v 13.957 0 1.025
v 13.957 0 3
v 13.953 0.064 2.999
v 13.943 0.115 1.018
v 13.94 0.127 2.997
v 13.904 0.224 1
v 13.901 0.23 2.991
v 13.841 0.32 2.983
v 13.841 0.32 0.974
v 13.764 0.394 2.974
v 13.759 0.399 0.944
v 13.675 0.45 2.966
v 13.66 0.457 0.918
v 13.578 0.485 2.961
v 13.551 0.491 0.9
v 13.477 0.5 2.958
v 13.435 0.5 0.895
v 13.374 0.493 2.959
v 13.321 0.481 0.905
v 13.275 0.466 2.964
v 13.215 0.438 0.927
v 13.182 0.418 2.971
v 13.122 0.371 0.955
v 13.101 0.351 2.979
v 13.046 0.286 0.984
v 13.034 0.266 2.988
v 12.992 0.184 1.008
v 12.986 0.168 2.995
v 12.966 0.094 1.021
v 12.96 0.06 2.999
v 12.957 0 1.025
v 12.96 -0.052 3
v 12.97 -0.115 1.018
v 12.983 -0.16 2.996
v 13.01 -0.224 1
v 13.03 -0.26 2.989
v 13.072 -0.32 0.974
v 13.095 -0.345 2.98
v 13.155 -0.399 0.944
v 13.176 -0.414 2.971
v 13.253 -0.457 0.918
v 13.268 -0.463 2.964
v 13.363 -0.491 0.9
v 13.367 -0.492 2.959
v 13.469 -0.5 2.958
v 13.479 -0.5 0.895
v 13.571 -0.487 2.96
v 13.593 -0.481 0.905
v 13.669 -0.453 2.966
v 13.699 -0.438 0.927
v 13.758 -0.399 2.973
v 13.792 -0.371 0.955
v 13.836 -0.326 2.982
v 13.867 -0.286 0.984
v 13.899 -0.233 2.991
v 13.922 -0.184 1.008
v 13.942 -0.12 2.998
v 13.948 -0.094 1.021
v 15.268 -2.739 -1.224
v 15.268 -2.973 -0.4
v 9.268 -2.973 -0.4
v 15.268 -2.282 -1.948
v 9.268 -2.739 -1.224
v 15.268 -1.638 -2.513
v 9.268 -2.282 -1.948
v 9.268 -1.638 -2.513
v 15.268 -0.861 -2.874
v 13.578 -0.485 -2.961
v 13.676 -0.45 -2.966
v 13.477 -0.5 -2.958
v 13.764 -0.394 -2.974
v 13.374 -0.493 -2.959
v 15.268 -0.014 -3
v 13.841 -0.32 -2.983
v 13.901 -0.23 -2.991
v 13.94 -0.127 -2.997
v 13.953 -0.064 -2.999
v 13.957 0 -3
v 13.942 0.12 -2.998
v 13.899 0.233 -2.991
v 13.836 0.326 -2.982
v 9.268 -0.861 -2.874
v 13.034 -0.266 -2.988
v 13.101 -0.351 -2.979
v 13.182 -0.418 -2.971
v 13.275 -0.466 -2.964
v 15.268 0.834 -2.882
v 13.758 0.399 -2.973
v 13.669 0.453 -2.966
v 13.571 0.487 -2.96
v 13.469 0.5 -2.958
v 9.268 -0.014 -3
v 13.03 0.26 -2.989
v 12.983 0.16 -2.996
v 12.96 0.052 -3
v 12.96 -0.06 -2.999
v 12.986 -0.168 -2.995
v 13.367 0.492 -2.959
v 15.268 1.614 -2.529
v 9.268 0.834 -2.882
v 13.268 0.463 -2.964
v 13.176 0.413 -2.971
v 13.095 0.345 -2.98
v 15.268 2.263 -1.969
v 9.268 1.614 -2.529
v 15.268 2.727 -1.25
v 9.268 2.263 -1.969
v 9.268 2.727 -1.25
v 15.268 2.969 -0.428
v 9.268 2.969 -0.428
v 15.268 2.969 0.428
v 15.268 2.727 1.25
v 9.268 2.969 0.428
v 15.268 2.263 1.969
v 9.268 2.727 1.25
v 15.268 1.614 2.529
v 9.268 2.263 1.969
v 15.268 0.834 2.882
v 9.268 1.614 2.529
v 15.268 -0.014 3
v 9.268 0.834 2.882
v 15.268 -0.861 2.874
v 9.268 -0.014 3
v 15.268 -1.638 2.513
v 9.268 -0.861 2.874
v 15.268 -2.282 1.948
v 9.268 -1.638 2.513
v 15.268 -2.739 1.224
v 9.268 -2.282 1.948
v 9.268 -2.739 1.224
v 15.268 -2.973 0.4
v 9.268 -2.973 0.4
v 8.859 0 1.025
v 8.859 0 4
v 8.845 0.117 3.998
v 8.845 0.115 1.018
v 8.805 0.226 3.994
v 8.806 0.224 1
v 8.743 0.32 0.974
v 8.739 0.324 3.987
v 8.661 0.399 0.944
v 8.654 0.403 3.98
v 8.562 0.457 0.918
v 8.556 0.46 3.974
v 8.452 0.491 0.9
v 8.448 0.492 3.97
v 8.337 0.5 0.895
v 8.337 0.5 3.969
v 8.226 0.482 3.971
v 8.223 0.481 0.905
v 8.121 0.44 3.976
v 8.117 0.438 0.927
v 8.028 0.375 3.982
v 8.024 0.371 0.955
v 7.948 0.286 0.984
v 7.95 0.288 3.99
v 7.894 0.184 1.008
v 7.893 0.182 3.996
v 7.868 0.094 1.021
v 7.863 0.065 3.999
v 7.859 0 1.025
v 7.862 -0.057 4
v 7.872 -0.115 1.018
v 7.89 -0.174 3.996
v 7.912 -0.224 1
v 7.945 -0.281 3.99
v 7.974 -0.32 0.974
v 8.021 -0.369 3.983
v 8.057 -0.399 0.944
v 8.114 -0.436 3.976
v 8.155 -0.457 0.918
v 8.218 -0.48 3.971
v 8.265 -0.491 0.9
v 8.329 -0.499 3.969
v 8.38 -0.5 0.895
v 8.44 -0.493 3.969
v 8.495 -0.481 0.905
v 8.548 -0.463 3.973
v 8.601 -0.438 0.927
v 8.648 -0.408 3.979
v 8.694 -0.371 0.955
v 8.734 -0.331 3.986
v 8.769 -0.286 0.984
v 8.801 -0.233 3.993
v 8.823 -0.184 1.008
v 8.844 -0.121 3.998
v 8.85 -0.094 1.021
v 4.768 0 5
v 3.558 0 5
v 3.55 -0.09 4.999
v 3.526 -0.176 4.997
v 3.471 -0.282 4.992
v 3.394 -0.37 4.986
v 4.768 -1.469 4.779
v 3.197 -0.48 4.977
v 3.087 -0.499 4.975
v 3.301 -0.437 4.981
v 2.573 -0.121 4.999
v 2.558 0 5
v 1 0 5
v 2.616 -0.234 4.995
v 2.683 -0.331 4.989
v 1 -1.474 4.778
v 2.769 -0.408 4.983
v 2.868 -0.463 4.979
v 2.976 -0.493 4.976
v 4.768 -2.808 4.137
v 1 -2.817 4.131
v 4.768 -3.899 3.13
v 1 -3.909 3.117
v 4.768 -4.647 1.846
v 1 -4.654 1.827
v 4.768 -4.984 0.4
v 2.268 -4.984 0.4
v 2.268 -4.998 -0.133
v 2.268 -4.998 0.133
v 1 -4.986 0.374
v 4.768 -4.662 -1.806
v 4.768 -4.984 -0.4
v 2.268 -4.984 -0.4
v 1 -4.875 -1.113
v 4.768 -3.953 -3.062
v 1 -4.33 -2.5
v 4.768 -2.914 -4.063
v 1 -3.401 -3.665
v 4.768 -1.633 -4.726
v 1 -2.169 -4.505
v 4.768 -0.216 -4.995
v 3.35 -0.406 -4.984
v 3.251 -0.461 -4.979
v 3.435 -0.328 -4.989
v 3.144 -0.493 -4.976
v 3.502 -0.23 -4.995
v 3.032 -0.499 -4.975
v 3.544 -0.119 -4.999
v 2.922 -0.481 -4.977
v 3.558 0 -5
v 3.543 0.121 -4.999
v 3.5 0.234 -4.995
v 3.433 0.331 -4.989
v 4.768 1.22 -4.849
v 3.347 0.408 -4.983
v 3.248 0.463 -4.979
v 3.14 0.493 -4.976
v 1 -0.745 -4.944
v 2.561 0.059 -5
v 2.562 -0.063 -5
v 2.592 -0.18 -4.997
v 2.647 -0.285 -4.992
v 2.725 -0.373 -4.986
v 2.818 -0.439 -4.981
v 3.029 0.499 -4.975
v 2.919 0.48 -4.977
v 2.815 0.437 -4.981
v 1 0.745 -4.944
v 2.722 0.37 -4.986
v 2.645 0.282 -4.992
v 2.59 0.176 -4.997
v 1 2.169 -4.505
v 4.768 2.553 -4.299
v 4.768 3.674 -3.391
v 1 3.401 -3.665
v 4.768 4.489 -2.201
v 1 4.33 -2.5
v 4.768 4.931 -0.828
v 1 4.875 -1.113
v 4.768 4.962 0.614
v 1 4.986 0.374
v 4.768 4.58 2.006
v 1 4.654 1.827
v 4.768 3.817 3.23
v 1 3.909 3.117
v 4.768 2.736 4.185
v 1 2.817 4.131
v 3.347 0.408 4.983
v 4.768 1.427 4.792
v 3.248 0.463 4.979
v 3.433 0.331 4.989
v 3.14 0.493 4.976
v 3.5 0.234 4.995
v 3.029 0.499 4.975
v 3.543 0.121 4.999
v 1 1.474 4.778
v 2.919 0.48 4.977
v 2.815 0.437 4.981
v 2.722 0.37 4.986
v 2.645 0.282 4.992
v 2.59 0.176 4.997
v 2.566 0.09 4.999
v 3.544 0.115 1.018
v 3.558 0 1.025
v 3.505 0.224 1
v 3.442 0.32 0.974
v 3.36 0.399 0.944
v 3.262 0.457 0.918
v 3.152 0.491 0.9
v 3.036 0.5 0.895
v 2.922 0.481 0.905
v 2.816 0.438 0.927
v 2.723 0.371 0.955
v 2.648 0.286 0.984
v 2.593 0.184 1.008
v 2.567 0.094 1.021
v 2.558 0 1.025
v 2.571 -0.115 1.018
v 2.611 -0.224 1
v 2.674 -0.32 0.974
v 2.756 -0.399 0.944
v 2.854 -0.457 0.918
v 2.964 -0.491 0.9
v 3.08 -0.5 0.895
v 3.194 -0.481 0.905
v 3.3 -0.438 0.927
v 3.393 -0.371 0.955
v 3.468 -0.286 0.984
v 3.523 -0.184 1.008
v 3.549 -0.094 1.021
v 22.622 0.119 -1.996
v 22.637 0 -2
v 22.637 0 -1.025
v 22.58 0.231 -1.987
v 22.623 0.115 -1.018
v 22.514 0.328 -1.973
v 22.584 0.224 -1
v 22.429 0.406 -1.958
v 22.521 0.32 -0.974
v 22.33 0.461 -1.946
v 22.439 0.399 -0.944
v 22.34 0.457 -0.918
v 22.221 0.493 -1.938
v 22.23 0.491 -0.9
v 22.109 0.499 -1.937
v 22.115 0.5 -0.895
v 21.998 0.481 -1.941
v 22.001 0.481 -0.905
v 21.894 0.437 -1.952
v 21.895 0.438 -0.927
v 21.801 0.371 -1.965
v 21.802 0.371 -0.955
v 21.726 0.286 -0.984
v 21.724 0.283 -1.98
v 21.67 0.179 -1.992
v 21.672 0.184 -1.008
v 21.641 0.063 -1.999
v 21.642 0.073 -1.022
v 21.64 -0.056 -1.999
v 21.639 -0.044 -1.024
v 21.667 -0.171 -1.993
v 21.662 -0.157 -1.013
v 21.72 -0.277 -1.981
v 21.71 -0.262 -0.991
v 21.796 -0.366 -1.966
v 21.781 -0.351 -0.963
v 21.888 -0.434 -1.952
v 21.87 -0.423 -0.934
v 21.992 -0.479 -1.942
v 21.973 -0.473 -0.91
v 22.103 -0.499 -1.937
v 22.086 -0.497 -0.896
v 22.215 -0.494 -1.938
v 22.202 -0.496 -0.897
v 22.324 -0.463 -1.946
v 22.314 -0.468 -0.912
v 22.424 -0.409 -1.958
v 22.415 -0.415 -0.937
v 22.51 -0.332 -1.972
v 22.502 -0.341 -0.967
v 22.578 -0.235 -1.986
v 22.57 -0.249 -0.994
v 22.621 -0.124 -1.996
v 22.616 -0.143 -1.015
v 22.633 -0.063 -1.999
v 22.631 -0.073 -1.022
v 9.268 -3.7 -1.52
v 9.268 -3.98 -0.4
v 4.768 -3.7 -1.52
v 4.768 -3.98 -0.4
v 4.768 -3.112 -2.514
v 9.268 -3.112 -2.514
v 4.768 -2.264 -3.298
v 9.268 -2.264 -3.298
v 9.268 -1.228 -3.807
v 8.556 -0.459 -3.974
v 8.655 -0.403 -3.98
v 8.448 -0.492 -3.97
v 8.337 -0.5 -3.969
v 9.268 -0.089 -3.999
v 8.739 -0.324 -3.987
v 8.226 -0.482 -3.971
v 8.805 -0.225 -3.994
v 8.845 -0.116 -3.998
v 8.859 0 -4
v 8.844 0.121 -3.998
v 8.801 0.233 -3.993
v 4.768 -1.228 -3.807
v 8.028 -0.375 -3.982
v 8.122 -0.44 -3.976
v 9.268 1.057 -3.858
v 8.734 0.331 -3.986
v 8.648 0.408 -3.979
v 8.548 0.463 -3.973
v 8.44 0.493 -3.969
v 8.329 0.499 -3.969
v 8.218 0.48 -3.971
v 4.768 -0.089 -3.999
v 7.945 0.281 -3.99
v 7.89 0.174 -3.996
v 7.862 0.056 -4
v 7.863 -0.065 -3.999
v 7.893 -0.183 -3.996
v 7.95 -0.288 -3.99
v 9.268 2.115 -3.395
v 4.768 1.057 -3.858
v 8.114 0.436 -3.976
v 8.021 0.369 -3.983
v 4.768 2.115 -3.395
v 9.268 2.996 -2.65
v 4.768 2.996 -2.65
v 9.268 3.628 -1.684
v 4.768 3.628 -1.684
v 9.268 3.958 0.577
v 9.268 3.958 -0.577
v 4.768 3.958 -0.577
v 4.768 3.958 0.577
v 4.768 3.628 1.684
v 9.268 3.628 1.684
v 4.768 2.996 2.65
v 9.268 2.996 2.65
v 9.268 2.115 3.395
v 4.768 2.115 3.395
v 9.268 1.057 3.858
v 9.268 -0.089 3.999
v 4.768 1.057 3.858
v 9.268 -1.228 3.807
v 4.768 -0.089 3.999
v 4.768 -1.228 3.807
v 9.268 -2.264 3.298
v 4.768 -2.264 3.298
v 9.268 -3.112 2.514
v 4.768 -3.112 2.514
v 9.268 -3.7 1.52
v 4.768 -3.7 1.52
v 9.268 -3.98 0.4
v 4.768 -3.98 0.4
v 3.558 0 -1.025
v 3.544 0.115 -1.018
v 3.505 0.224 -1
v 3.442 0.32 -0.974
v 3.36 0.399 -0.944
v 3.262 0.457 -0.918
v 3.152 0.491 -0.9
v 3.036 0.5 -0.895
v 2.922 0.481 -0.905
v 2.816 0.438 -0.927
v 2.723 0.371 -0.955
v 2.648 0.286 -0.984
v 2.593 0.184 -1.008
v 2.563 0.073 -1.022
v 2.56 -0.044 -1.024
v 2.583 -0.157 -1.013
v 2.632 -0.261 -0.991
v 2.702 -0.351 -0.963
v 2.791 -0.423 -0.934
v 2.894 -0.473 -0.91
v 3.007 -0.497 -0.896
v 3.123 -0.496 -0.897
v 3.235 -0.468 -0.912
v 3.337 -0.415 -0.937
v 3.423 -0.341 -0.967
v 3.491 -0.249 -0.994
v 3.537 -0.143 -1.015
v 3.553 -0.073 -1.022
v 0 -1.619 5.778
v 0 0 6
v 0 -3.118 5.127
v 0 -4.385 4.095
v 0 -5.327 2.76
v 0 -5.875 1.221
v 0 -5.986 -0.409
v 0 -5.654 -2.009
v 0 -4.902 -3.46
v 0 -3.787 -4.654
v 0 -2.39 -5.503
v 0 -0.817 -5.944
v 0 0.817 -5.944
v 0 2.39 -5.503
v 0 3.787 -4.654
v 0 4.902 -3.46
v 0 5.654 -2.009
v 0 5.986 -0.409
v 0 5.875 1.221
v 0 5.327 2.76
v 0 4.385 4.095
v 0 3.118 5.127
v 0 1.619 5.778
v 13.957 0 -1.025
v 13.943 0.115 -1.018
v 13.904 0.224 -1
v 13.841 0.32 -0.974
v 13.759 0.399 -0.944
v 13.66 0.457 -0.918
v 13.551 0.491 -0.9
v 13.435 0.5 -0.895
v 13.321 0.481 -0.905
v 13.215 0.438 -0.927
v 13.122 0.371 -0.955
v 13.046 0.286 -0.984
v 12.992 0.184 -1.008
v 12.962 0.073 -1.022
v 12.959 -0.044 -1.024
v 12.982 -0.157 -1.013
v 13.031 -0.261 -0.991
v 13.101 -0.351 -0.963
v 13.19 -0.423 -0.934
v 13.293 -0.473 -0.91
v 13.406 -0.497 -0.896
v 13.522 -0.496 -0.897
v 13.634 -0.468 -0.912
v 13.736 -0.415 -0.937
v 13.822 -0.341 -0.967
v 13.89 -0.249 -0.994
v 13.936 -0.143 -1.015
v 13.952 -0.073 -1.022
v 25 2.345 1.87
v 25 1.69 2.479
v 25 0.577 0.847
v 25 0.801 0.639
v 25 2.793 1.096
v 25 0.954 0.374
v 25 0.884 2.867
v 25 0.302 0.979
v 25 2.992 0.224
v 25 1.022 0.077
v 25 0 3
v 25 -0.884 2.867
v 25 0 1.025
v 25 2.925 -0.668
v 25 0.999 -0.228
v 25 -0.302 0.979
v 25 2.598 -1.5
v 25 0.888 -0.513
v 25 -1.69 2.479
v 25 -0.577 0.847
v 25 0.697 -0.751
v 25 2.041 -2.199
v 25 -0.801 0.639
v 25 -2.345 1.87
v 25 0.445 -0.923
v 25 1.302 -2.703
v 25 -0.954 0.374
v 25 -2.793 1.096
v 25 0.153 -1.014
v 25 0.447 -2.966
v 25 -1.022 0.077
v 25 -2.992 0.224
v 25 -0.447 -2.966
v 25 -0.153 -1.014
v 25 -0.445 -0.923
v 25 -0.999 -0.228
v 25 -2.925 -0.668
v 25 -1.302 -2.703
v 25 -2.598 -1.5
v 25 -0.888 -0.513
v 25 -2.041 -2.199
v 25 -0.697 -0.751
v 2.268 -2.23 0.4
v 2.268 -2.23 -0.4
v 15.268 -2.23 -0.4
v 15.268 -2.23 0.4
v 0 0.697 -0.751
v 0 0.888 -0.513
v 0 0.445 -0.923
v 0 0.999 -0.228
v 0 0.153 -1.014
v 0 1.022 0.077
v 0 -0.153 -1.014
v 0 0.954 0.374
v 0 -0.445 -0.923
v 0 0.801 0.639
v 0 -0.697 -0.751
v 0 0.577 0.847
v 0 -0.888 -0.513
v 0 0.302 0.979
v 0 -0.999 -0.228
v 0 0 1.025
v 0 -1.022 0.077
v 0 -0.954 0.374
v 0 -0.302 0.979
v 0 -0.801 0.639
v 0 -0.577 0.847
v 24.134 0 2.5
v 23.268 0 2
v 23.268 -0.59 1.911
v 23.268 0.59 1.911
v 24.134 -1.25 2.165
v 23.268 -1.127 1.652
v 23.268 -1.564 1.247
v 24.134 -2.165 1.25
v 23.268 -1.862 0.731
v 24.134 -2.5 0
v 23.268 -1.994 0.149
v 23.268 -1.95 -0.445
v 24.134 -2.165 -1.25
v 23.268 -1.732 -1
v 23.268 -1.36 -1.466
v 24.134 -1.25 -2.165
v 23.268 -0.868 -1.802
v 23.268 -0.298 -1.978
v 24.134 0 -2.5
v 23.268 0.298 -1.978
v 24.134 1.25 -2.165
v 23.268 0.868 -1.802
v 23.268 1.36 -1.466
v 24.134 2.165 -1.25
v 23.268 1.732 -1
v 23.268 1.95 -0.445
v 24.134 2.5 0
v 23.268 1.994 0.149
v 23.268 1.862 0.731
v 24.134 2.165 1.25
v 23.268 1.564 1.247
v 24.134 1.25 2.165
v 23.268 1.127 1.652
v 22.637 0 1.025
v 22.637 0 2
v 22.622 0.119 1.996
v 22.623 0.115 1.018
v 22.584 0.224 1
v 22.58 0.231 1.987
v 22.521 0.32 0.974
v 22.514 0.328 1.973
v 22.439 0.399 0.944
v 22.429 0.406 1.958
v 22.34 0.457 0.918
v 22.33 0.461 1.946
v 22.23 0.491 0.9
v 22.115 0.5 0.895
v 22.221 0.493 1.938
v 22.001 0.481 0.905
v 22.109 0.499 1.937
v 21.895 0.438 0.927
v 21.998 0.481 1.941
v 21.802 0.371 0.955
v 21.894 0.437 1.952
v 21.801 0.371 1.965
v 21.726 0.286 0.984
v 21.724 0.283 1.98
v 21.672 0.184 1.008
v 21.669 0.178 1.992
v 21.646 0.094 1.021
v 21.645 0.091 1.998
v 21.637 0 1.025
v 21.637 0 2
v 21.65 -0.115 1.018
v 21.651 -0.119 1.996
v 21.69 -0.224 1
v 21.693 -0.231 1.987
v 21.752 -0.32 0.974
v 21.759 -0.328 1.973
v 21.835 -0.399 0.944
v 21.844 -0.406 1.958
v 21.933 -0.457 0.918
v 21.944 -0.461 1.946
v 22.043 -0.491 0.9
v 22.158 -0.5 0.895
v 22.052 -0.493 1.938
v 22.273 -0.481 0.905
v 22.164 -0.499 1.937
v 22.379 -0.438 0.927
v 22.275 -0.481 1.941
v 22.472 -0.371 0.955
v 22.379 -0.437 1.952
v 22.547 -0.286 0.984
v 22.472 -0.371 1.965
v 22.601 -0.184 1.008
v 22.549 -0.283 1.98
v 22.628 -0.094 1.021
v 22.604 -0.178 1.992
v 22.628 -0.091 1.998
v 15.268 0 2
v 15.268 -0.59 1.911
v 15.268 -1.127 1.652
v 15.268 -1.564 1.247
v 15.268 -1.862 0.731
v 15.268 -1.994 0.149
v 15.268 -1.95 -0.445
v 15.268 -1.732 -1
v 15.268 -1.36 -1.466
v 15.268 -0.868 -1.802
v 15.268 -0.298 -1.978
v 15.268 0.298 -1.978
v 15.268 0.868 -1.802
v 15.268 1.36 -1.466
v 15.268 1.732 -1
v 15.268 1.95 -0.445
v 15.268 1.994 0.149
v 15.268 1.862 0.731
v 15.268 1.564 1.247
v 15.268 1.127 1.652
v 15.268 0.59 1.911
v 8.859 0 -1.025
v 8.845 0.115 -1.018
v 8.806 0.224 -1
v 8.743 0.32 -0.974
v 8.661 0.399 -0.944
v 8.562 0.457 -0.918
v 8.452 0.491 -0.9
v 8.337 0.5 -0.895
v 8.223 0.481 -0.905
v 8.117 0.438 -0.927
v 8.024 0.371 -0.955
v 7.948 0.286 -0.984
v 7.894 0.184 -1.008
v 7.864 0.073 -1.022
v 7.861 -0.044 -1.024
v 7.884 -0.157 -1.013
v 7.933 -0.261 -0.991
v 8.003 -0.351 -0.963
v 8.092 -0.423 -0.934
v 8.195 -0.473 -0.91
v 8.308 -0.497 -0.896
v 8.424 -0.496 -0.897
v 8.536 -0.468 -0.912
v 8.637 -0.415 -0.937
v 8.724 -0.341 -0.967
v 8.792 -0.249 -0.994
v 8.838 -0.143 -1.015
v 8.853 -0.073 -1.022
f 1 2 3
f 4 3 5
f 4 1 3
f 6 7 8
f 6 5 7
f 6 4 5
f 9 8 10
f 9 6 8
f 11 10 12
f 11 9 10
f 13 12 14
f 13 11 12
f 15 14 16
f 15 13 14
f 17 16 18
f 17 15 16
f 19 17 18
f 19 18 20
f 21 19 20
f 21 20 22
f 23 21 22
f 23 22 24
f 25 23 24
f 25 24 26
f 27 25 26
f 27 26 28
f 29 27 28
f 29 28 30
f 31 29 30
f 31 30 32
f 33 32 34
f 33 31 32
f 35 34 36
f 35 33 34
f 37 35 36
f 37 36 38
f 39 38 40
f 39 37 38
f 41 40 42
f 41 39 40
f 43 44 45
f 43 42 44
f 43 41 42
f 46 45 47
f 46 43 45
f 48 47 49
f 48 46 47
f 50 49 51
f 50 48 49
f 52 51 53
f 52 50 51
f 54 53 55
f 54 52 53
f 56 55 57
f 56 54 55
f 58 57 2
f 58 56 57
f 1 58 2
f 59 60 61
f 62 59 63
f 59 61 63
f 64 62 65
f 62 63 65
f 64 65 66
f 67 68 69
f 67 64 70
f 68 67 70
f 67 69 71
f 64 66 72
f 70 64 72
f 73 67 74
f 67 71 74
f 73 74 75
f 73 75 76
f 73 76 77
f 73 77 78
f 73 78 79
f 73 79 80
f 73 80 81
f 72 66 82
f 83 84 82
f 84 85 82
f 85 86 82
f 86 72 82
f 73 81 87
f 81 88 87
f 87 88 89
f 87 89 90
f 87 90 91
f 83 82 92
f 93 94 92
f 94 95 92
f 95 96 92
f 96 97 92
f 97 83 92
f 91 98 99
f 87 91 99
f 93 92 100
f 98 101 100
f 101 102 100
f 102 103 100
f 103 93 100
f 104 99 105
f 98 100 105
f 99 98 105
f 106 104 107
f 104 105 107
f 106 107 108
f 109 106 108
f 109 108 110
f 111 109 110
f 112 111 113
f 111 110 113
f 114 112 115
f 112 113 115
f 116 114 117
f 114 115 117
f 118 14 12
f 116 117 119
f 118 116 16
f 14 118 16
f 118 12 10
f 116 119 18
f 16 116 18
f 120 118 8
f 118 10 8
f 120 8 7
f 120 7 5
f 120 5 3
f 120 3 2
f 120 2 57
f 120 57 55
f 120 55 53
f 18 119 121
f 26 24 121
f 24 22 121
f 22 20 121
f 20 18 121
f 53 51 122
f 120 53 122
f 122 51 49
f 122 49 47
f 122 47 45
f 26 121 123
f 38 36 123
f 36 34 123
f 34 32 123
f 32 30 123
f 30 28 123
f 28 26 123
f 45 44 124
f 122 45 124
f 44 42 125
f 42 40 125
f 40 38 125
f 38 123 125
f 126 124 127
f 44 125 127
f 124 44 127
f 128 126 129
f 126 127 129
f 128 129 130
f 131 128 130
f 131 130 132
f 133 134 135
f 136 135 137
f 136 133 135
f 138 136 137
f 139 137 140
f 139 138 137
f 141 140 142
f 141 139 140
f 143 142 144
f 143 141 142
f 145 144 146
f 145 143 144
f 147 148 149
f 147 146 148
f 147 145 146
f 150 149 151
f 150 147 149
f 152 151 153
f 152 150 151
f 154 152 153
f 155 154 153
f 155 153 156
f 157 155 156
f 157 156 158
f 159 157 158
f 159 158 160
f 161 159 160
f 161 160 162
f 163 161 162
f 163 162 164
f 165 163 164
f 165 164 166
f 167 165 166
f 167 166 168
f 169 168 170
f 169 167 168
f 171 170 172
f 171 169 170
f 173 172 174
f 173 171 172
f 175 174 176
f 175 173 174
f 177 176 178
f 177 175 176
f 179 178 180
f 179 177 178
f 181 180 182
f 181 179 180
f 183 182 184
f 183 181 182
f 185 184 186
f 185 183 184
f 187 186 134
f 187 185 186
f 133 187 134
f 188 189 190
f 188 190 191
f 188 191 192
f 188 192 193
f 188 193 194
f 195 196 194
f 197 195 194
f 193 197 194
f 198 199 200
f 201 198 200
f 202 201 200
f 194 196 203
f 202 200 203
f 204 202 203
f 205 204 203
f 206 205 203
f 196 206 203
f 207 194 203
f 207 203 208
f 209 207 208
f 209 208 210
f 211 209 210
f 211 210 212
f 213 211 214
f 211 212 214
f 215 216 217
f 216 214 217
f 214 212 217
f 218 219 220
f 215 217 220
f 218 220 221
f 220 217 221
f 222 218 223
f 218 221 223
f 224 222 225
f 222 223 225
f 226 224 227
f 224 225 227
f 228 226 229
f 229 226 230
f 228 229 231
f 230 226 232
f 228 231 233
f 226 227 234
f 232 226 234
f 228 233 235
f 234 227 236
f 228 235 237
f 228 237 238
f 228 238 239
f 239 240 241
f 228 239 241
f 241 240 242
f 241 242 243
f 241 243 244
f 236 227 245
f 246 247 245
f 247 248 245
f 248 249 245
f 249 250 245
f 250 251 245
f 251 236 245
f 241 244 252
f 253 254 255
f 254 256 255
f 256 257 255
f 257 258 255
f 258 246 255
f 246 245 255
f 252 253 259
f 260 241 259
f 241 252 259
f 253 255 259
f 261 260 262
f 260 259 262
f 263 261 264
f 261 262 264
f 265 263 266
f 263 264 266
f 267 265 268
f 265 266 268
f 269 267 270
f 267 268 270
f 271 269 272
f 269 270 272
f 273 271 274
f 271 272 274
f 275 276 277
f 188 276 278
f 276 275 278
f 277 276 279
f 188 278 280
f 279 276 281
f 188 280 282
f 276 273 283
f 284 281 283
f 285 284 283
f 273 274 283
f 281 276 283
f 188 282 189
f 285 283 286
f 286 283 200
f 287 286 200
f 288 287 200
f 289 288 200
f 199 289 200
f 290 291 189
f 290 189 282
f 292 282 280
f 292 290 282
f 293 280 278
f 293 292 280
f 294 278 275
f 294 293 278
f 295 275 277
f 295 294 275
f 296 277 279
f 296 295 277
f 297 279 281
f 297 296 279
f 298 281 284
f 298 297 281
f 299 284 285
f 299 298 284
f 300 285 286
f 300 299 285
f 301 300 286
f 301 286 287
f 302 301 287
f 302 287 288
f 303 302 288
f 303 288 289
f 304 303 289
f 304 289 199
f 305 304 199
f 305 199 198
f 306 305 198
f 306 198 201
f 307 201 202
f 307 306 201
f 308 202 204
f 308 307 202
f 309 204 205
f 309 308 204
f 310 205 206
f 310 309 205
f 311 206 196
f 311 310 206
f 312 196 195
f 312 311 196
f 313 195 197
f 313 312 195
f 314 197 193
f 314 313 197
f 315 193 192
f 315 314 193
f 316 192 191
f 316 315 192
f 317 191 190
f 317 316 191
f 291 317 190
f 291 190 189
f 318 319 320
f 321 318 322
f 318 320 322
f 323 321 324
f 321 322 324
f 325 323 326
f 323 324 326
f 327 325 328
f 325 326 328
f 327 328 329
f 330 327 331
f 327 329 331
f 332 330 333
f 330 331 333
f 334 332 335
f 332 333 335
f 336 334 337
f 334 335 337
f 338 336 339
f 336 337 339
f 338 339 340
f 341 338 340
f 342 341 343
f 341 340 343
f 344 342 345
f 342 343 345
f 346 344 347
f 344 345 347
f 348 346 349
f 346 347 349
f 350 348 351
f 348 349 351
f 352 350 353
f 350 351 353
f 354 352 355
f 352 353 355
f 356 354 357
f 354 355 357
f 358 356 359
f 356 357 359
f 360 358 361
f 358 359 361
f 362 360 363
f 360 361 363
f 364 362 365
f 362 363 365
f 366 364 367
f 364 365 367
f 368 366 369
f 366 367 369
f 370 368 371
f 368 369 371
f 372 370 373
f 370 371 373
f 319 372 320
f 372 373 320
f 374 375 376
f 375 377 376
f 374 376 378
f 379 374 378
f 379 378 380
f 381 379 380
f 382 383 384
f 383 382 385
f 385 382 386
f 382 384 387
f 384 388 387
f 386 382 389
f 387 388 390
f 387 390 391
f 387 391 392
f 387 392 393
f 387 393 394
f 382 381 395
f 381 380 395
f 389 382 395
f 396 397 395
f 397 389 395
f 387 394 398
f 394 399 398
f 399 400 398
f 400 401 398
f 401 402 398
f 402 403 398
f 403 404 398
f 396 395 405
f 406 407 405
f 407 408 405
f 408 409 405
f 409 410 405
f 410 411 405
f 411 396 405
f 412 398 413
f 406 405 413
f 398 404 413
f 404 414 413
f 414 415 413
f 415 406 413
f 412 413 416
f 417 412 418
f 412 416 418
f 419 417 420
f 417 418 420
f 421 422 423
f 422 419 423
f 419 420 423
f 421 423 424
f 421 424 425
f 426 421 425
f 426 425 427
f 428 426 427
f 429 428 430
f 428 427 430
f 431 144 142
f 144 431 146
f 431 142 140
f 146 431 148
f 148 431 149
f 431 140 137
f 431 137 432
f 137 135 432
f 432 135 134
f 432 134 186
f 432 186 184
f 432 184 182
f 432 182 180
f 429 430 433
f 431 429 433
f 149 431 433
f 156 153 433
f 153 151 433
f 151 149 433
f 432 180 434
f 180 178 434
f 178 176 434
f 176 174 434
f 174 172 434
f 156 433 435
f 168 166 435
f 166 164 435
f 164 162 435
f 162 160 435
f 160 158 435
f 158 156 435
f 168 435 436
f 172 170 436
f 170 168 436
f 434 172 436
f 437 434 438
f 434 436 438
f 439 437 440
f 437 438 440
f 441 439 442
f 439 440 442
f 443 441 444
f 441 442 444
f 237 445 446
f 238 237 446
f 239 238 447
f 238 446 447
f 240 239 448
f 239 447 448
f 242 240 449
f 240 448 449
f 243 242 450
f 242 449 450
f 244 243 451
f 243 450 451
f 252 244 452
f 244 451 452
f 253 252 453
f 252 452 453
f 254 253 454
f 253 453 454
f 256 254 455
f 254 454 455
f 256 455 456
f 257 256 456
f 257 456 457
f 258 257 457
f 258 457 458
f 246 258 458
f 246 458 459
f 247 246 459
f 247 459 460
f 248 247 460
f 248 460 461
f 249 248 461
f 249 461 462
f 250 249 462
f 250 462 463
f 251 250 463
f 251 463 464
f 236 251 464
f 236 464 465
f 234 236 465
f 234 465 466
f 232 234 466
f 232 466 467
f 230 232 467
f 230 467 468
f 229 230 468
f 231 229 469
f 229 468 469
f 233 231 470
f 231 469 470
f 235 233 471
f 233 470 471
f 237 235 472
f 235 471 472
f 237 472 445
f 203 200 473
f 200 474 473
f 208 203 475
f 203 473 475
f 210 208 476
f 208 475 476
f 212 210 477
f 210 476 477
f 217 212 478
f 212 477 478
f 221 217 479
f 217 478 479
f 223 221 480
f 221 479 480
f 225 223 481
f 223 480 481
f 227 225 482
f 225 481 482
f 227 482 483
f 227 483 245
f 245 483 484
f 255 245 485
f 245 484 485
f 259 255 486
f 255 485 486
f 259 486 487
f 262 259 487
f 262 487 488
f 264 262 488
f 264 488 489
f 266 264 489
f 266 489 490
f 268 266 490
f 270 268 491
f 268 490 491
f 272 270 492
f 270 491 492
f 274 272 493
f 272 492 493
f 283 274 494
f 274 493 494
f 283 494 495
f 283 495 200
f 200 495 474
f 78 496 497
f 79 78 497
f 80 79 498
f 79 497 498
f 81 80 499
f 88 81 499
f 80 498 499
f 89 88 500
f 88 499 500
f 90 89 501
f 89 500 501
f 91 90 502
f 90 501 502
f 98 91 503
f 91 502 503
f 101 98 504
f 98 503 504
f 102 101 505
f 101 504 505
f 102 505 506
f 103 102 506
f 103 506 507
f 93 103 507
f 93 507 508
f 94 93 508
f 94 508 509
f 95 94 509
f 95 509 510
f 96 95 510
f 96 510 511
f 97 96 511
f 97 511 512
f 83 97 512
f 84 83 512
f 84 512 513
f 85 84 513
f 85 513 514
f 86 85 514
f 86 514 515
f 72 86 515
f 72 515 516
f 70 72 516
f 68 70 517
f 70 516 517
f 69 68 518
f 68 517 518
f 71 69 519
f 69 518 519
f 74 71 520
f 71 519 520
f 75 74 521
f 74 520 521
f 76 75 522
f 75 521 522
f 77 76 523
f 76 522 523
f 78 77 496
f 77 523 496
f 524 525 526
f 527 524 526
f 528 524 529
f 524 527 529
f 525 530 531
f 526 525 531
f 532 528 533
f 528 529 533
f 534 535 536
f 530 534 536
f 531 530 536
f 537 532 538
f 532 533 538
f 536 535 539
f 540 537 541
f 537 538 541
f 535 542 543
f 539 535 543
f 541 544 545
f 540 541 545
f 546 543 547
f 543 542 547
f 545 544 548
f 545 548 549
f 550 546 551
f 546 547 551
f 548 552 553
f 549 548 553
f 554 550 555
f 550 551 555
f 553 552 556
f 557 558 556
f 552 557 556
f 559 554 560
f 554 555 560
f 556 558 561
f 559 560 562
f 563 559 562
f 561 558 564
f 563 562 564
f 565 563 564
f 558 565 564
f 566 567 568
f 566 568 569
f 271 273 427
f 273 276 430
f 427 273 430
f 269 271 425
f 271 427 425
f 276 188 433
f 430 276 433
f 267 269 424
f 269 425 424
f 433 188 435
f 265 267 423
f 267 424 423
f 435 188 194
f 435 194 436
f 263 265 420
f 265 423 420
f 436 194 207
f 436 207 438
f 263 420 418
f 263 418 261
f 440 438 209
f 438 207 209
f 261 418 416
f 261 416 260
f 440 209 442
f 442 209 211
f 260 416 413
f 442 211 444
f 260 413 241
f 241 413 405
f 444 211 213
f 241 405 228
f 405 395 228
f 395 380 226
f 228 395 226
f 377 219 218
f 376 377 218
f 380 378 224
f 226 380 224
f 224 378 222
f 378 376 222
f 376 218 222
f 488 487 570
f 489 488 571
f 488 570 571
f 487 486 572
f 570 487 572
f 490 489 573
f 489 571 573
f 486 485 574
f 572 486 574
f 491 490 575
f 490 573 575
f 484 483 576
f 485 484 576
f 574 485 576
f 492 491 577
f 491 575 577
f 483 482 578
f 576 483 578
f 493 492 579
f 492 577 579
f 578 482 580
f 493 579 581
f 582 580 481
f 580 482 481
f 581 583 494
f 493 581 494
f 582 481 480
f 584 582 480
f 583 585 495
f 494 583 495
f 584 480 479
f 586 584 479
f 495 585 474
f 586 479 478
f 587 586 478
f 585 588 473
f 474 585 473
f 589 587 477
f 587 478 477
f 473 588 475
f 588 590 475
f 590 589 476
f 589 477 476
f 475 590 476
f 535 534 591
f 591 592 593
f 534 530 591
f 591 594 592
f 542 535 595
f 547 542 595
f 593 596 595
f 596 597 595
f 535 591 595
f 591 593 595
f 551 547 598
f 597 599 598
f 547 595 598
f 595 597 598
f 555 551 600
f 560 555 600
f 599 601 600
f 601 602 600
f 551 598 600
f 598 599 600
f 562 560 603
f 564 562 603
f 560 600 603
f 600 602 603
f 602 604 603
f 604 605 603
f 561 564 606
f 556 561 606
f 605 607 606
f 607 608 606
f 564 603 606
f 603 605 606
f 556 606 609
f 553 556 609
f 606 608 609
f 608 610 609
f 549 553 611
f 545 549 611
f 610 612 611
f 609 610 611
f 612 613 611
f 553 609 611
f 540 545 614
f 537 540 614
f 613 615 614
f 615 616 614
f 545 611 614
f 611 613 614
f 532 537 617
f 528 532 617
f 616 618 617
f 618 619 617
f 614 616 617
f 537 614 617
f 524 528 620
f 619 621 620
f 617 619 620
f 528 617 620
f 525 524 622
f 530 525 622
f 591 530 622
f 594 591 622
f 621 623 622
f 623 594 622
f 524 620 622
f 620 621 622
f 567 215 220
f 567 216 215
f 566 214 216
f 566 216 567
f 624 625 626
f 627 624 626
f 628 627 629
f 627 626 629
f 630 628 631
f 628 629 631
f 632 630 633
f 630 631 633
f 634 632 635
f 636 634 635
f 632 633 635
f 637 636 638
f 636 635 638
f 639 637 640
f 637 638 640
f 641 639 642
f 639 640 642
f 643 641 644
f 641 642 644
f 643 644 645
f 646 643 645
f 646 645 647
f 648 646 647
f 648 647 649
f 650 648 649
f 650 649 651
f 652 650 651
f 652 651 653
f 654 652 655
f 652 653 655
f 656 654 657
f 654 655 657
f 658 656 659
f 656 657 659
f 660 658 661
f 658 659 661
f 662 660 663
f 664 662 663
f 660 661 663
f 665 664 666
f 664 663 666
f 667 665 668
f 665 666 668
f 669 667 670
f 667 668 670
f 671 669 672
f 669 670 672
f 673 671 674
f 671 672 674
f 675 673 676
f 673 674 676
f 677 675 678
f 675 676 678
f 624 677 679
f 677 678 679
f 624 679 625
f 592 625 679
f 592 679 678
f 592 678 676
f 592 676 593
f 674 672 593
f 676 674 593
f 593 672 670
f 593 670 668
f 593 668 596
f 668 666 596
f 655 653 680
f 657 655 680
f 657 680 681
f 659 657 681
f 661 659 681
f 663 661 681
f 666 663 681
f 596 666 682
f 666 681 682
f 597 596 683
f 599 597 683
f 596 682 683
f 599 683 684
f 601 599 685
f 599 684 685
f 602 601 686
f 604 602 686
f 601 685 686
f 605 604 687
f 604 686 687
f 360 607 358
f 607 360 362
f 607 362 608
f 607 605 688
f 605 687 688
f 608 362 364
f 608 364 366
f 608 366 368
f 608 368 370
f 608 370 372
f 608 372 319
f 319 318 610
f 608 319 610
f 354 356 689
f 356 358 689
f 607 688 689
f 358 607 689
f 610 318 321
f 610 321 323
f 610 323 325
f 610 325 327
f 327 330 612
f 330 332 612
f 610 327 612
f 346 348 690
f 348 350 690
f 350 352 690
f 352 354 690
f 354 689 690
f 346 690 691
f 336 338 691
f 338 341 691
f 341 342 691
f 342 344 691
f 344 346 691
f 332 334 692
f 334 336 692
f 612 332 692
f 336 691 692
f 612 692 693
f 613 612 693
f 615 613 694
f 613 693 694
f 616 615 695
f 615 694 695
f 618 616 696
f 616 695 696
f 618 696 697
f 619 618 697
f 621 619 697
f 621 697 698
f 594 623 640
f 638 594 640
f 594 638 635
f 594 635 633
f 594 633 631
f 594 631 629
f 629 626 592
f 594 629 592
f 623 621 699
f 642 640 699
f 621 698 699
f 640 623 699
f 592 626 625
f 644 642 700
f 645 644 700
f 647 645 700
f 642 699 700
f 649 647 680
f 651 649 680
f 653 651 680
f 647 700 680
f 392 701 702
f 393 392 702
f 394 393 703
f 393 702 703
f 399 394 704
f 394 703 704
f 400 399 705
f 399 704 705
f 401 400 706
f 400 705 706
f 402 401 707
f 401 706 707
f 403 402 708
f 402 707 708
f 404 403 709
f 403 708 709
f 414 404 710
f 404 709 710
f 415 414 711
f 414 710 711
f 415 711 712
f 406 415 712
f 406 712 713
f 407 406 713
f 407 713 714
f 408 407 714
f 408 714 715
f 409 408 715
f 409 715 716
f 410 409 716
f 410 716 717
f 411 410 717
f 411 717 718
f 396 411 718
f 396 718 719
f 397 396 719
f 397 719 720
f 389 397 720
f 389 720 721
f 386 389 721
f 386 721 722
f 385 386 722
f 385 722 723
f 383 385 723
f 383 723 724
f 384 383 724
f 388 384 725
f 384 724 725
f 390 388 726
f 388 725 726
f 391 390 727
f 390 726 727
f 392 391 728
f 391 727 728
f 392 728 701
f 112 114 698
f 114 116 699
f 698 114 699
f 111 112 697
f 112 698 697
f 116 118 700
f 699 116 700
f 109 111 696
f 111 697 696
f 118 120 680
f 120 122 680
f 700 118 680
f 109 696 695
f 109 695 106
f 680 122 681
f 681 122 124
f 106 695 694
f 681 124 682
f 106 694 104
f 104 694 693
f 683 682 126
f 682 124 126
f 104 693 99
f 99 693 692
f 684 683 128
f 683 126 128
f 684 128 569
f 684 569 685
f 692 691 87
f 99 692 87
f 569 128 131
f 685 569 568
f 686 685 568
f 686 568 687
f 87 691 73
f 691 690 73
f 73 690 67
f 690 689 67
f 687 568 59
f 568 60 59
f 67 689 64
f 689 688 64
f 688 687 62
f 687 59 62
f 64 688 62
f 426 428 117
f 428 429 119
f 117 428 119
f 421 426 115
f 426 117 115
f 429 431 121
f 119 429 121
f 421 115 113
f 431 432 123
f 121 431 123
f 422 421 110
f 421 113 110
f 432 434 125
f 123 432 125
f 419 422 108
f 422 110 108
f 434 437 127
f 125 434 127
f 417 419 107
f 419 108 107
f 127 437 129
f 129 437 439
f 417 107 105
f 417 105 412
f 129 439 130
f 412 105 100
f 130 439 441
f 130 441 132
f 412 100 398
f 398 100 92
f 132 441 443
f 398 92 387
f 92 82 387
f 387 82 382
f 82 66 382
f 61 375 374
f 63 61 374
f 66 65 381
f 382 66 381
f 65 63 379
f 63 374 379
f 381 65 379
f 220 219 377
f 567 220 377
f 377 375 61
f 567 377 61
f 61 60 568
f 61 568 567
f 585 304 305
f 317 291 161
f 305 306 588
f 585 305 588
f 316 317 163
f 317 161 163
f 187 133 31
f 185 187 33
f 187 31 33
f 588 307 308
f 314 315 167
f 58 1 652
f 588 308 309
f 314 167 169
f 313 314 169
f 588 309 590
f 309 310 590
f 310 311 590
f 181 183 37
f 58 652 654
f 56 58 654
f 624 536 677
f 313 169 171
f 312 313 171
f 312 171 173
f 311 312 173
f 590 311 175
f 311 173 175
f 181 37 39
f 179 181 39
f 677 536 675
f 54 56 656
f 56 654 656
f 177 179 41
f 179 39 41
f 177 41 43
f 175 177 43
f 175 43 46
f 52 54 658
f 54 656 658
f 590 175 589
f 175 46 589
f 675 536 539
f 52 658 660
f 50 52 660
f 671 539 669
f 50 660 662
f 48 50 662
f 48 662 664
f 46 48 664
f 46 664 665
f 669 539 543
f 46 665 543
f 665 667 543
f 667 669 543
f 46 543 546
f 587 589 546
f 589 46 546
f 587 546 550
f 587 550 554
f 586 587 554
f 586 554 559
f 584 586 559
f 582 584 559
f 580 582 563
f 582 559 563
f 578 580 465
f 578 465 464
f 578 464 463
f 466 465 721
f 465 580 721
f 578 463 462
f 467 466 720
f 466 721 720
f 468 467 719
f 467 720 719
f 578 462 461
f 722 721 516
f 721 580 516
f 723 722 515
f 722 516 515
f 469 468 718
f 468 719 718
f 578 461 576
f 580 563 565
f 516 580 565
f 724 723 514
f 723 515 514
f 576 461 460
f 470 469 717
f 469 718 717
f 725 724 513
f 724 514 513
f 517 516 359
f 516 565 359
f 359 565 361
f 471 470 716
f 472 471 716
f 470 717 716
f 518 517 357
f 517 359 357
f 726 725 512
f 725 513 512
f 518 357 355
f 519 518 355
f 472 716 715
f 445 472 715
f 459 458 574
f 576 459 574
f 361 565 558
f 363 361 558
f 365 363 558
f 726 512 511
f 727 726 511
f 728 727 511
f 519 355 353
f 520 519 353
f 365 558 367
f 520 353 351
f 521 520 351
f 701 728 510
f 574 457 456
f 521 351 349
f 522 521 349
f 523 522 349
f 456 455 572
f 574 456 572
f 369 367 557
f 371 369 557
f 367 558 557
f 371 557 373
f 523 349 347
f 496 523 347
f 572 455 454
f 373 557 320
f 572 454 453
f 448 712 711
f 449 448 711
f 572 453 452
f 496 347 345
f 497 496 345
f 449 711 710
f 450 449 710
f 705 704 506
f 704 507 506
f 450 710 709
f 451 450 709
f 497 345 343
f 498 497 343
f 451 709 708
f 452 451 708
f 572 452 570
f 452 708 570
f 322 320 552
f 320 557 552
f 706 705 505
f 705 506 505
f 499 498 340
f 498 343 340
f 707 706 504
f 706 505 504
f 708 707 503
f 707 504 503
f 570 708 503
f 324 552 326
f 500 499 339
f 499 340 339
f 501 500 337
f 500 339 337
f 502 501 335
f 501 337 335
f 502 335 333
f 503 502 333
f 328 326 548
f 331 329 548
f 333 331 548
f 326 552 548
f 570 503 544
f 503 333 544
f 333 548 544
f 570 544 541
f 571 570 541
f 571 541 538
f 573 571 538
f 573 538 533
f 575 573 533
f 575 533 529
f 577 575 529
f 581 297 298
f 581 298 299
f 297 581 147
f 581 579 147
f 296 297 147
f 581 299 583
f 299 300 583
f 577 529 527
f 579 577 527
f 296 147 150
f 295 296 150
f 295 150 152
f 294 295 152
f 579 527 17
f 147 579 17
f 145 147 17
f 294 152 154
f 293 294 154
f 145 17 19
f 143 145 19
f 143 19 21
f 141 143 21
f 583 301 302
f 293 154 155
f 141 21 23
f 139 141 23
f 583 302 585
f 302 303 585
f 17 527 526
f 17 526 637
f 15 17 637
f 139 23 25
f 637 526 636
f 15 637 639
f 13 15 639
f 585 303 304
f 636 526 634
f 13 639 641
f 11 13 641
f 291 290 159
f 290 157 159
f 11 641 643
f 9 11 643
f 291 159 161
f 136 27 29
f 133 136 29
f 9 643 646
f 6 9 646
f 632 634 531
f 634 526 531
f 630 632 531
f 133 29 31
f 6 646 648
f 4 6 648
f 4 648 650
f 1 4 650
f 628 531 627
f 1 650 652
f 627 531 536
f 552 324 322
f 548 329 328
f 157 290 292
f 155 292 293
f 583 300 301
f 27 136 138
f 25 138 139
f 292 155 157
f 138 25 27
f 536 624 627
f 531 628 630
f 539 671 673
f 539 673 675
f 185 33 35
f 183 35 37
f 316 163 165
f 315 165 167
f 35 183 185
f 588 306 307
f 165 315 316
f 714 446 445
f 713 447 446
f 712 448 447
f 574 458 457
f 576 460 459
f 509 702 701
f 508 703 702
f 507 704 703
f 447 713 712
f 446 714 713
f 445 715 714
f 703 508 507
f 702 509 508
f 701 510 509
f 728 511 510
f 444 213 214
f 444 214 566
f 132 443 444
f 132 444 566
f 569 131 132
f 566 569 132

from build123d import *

# Parameters (mm, degrees)
F2_R     = 0.5
F3_DEPTH = 12.5
F4_W     = 2.789457
F4_H     = 0.8
F5_DEPTH = 13


with BuildPart() as f1:
    # F0 (on Front) → F1 (revolve)
    with BuildSketch(Plane.XZ):
        Polygon((1, 5), (0, 6), (0, 1.025), (25, 1.025), (25, 3), (23.267949, 2), (15.267949, 2), (15.267949, 3), (9.267949, 3), (9.267949, 4), (4.767949, 4), (4.767949, 5), align=None)
    revolve(axis=Axis((6.044726, 0, 0), (1, 0, 0)))

    # F2 (on Top) → F3 (cut, symmetric)
    with BuildSketch(Plane.XY):
        with Locations((3.057949, 0)):
            Circle(F2_R)
        with Locations((8.358715, 0)):
            Circle(F2_R)
        with Locations((13.456892, 0)):
            Circle(F2_R)
        with Locations((22.136655, 0)):
            Circle(F2_R)
    extrude(amount=F3_DEPTH, both=True, mode=Mode.SUBTRACT)

    # F4 (on face) → F5 (cut)
    with BuildSketch(Plane.YZ.offset(15.267949)):
        with Locations((-3.624397, 0)):
            Rectangle(F4_W, F4_H)
    extrude(amount=-F5_DEPTH, mode=Mode.SUBTRACT)


solid = f1.part
